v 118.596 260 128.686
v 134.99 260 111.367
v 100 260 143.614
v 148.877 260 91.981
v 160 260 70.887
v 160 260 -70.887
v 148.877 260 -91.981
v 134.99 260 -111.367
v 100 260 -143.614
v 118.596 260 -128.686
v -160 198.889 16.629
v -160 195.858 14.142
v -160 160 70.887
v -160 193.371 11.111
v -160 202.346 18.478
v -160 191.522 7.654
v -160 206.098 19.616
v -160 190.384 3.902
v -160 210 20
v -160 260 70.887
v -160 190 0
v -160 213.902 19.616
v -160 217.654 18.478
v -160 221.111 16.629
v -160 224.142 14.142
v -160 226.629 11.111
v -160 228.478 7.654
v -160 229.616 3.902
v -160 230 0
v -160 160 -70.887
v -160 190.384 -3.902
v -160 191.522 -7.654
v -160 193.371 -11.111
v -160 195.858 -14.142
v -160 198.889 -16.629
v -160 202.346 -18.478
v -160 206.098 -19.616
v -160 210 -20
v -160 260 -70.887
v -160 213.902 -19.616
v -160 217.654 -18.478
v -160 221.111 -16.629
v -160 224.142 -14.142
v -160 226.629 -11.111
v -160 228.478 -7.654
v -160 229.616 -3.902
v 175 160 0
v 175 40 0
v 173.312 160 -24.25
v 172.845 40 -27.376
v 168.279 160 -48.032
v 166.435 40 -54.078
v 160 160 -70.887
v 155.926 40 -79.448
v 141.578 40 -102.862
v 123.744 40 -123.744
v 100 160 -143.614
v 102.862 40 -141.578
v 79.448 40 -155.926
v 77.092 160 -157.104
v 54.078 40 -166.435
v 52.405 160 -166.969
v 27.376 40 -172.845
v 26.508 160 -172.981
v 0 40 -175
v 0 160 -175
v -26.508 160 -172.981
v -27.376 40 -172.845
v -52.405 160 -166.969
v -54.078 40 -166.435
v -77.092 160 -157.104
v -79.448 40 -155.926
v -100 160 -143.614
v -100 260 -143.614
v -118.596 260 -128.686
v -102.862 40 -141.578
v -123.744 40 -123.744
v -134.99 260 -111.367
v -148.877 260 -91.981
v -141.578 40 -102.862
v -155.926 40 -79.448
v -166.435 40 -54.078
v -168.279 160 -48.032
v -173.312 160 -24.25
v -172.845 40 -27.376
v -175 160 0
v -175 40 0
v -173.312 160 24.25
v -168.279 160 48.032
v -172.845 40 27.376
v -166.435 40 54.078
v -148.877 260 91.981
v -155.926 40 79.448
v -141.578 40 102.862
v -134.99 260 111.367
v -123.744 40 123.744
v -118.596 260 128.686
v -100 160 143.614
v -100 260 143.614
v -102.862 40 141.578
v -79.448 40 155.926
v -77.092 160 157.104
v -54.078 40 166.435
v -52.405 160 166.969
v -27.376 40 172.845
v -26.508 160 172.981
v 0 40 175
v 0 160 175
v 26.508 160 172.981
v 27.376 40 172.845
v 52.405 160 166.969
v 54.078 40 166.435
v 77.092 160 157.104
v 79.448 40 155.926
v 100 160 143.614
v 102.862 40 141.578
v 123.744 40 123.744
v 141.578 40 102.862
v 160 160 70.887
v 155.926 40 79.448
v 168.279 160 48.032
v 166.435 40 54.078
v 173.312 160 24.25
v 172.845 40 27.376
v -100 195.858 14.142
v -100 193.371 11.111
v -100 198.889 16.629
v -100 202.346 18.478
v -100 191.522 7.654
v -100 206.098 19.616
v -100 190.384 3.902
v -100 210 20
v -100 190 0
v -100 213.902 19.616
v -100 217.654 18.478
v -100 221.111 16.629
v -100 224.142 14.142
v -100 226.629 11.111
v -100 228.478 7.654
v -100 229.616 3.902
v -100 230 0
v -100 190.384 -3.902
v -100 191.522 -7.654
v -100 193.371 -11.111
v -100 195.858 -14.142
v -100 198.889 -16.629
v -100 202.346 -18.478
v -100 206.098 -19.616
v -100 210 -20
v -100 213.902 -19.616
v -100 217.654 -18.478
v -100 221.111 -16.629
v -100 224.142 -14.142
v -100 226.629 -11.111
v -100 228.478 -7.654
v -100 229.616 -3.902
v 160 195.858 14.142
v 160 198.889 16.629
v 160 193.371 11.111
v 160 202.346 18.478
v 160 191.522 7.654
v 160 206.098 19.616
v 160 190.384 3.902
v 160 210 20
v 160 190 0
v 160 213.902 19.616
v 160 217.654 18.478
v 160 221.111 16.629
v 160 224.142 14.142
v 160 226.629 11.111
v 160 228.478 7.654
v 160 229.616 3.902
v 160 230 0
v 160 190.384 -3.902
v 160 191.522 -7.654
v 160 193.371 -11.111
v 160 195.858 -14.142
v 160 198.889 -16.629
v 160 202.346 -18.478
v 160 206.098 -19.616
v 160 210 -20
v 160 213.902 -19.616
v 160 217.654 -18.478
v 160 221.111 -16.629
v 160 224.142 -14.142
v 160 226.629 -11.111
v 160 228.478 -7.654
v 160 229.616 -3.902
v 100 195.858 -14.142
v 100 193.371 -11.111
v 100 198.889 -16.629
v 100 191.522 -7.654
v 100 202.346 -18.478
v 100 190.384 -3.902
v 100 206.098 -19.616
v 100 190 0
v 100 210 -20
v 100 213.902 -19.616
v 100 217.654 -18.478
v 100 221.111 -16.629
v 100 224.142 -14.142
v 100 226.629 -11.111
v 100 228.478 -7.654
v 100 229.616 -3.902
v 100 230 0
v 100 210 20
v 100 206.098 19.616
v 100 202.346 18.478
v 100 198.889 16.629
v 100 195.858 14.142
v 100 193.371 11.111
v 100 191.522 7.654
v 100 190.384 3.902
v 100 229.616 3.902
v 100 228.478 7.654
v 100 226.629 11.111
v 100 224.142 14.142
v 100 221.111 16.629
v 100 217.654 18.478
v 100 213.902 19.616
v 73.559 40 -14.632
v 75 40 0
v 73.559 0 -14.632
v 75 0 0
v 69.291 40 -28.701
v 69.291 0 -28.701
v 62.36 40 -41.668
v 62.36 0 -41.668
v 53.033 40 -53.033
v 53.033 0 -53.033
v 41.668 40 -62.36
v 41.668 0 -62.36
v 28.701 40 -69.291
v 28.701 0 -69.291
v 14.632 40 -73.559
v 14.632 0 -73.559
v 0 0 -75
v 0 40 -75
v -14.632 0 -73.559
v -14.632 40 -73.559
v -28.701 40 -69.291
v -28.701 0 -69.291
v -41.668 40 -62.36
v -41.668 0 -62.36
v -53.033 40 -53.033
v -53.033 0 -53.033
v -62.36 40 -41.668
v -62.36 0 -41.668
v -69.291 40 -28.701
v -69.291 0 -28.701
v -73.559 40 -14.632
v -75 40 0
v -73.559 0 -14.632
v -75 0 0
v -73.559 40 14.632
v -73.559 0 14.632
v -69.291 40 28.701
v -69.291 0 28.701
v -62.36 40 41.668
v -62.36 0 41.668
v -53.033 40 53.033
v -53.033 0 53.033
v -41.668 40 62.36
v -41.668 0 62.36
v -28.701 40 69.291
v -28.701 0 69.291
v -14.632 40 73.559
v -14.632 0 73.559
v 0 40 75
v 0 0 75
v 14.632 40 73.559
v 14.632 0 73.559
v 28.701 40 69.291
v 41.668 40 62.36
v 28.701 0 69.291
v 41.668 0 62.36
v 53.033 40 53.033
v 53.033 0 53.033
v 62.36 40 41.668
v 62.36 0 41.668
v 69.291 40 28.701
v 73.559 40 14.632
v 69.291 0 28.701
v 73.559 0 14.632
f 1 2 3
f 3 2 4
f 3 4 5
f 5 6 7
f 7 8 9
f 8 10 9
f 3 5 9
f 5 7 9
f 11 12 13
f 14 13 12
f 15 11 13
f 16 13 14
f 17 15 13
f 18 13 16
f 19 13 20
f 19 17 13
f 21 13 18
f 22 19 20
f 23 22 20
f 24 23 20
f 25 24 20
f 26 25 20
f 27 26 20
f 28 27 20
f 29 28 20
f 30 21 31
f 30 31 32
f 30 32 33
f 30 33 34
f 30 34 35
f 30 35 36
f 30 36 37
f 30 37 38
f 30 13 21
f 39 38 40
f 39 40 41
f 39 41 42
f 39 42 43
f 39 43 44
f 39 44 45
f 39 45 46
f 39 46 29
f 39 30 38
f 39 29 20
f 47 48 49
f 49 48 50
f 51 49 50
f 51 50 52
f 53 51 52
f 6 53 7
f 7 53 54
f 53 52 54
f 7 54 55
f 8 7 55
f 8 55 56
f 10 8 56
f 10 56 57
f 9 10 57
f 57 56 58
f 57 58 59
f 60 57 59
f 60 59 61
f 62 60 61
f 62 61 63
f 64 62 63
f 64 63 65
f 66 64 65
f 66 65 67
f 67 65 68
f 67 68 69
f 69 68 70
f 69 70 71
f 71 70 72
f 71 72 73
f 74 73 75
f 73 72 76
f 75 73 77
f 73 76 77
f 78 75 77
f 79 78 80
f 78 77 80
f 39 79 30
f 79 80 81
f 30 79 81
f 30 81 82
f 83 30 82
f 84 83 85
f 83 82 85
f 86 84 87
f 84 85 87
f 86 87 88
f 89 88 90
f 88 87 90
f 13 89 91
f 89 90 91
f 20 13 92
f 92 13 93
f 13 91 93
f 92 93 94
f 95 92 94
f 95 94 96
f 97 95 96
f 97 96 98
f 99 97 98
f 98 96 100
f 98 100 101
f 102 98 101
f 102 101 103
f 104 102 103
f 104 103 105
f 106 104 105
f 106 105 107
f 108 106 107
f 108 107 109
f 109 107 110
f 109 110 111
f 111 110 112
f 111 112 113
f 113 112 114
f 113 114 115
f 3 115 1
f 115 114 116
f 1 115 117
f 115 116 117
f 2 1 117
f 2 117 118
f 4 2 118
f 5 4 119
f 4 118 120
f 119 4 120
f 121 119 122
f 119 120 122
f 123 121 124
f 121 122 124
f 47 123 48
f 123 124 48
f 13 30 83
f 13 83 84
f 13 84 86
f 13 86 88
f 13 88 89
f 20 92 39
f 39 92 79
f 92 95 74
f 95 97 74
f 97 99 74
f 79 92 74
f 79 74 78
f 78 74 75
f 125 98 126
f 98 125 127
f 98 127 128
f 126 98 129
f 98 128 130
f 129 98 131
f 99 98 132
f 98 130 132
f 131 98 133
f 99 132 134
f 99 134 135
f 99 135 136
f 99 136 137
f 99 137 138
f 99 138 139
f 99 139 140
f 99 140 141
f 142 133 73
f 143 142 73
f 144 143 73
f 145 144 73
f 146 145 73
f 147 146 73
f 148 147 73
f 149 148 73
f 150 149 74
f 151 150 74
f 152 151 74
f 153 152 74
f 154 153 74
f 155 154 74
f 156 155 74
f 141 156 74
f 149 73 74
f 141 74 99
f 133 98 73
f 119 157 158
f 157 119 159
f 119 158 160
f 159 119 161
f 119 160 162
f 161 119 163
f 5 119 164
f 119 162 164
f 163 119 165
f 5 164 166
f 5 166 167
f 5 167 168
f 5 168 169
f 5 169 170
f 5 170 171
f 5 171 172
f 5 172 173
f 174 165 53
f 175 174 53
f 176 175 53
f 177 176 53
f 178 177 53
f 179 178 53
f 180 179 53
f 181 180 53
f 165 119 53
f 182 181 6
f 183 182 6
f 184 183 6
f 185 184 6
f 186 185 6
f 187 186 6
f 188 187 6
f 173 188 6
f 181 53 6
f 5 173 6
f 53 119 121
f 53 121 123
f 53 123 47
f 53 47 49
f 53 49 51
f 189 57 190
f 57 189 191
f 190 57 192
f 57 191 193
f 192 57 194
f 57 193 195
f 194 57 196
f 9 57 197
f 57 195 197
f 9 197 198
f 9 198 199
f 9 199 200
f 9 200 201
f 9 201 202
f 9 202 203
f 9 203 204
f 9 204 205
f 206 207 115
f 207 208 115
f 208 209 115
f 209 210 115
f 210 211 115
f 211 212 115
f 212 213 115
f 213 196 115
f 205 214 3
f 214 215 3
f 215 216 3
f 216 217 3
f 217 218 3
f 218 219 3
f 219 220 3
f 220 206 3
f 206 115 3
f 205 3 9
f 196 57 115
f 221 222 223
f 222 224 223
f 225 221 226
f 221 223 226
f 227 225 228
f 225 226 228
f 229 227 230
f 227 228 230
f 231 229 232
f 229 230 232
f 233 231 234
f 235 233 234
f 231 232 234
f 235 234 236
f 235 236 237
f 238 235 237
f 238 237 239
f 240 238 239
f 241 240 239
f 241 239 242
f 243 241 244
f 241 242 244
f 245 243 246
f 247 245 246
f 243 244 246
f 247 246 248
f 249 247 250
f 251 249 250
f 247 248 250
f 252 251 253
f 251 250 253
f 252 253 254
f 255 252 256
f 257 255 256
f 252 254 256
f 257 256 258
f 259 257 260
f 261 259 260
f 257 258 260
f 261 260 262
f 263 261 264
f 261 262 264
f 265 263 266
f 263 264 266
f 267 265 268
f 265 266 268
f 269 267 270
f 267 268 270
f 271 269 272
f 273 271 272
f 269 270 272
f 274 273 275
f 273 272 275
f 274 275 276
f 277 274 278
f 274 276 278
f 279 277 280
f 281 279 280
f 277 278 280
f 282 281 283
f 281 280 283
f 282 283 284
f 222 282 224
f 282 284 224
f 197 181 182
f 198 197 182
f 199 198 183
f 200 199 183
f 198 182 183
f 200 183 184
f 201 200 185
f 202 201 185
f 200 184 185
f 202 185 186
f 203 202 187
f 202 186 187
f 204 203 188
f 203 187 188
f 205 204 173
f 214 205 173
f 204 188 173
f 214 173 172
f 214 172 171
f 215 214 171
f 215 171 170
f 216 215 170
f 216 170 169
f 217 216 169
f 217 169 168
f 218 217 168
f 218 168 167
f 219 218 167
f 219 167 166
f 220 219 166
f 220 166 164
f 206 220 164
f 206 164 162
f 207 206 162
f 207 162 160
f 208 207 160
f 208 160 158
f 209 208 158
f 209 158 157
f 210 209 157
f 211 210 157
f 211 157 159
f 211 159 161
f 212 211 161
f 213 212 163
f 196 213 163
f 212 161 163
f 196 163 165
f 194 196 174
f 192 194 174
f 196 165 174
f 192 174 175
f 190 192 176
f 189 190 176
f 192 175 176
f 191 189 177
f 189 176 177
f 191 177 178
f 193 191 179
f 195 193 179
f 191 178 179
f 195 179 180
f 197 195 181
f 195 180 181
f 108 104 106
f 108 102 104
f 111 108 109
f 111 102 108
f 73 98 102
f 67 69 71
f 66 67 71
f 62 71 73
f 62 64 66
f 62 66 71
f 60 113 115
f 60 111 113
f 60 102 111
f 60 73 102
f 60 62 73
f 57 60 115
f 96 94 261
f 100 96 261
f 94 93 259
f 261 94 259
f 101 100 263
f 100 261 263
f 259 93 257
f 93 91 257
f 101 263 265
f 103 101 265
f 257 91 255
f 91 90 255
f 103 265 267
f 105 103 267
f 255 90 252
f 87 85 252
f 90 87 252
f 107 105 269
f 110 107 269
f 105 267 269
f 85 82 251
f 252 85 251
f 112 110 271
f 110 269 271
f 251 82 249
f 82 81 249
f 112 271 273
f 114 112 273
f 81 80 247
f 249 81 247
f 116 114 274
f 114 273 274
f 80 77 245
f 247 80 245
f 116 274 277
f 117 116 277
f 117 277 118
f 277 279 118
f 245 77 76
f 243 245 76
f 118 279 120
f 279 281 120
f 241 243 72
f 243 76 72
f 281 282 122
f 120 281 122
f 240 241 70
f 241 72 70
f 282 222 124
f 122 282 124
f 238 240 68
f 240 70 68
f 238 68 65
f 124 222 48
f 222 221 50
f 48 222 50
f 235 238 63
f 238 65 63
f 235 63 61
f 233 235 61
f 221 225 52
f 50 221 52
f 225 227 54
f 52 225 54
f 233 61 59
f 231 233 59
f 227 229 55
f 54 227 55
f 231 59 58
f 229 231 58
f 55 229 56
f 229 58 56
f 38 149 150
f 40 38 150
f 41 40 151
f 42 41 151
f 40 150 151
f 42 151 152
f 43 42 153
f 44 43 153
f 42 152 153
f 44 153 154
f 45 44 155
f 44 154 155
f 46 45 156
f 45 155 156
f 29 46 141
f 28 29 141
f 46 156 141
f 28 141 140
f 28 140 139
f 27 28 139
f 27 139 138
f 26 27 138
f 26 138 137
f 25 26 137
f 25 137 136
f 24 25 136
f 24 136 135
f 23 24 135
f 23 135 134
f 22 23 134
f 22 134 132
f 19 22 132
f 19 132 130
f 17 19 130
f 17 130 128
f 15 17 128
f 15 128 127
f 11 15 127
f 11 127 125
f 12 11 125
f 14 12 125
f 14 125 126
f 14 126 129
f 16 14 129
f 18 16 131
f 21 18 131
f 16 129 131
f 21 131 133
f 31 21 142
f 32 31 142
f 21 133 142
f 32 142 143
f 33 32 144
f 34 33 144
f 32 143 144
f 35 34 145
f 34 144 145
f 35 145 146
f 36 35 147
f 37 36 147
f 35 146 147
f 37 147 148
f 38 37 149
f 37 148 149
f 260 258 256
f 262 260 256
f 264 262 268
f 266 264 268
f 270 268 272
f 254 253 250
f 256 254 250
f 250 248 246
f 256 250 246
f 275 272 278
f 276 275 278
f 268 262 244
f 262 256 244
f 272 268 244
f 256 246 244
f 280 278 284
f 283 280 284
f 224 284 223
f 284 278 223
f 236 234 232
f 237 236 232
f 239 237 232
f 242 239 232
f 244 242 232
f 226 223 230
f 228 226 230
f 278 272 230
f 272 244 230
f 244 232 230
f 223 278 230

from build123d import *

# Parameters (mm, degrees)
ESBO_O2_W                  = 200
ESBO_O2_H                  = 100
ESBO_O2_W_2                = 15
CORTE_EXTRUS_O1_DEPTH      = 176
CORTE_EXTRUS_O1_DEPTH_BACK = 176
ESBO_O3_R                  = 20
CORTE_EXTRUS_O2_DEPTH      = 16
CORTE_EXTRUS_O2_DEPTH_BACK = 336


with BuildPart() as part:
    # Esboço1 → Revolução1 (revolve)
    with BuildSketch(Plane.XY):
        Polygon((0, 260), (175, 260), (175, 40), (75, 40), (75, 0), (0, 0), align=None)
    revolve(axis=Axis((0, 0, 0), (0, 1, 0)))

    # Esboço2 → Corte-extrusão1 (cut, two sides)
    with BuildSketch(Plane.XY) as corte_extrus_o1_sk:
        with Locations((0, 210)):
            Rectangle(ESBO_O2_W, ESBO_O2_H)
        with Locations((167.5, 210)):
            Rectangle(ESBO_O2_W_2, ESBO_O2_H)
        with Locations((-167.5, 210)):
            Rectangle(ESBO_O2_W_2, ESBO_O2_H)
    extrude(amount=CORTE_EXTRUS_O1_DEPTH, mode=Mode.SUBTRACT)
    extrude(corte_extrus_o1_sk.sketch, amount=-CORTE_EXTRUS_O1_DEPTH_BACK, mode=Mode.SUBTRACT)

    # Esboço3 → Corte-extrusão2 (cut, two sides)
    with BuildSketch(Plane(origin=(160, 0, 0), x_dir=(0, 0, -1), z_dir=(1, 0, 0))) as corte_extrus_o2_sk:
        with Locations((0, 210)):
            Circle(ESBO_O3_R)
    extrude(amount=CORTE_EXTRUS_O2_DEPTH, mode=Mode.SUBTRACT)
    extrude(corte_extrus_o2_sk.sketch, amount=-CORTE_EXTRUS_O2_DEPTH_BACK, mode=Mode.SUBTRACT)


solid = part.part
